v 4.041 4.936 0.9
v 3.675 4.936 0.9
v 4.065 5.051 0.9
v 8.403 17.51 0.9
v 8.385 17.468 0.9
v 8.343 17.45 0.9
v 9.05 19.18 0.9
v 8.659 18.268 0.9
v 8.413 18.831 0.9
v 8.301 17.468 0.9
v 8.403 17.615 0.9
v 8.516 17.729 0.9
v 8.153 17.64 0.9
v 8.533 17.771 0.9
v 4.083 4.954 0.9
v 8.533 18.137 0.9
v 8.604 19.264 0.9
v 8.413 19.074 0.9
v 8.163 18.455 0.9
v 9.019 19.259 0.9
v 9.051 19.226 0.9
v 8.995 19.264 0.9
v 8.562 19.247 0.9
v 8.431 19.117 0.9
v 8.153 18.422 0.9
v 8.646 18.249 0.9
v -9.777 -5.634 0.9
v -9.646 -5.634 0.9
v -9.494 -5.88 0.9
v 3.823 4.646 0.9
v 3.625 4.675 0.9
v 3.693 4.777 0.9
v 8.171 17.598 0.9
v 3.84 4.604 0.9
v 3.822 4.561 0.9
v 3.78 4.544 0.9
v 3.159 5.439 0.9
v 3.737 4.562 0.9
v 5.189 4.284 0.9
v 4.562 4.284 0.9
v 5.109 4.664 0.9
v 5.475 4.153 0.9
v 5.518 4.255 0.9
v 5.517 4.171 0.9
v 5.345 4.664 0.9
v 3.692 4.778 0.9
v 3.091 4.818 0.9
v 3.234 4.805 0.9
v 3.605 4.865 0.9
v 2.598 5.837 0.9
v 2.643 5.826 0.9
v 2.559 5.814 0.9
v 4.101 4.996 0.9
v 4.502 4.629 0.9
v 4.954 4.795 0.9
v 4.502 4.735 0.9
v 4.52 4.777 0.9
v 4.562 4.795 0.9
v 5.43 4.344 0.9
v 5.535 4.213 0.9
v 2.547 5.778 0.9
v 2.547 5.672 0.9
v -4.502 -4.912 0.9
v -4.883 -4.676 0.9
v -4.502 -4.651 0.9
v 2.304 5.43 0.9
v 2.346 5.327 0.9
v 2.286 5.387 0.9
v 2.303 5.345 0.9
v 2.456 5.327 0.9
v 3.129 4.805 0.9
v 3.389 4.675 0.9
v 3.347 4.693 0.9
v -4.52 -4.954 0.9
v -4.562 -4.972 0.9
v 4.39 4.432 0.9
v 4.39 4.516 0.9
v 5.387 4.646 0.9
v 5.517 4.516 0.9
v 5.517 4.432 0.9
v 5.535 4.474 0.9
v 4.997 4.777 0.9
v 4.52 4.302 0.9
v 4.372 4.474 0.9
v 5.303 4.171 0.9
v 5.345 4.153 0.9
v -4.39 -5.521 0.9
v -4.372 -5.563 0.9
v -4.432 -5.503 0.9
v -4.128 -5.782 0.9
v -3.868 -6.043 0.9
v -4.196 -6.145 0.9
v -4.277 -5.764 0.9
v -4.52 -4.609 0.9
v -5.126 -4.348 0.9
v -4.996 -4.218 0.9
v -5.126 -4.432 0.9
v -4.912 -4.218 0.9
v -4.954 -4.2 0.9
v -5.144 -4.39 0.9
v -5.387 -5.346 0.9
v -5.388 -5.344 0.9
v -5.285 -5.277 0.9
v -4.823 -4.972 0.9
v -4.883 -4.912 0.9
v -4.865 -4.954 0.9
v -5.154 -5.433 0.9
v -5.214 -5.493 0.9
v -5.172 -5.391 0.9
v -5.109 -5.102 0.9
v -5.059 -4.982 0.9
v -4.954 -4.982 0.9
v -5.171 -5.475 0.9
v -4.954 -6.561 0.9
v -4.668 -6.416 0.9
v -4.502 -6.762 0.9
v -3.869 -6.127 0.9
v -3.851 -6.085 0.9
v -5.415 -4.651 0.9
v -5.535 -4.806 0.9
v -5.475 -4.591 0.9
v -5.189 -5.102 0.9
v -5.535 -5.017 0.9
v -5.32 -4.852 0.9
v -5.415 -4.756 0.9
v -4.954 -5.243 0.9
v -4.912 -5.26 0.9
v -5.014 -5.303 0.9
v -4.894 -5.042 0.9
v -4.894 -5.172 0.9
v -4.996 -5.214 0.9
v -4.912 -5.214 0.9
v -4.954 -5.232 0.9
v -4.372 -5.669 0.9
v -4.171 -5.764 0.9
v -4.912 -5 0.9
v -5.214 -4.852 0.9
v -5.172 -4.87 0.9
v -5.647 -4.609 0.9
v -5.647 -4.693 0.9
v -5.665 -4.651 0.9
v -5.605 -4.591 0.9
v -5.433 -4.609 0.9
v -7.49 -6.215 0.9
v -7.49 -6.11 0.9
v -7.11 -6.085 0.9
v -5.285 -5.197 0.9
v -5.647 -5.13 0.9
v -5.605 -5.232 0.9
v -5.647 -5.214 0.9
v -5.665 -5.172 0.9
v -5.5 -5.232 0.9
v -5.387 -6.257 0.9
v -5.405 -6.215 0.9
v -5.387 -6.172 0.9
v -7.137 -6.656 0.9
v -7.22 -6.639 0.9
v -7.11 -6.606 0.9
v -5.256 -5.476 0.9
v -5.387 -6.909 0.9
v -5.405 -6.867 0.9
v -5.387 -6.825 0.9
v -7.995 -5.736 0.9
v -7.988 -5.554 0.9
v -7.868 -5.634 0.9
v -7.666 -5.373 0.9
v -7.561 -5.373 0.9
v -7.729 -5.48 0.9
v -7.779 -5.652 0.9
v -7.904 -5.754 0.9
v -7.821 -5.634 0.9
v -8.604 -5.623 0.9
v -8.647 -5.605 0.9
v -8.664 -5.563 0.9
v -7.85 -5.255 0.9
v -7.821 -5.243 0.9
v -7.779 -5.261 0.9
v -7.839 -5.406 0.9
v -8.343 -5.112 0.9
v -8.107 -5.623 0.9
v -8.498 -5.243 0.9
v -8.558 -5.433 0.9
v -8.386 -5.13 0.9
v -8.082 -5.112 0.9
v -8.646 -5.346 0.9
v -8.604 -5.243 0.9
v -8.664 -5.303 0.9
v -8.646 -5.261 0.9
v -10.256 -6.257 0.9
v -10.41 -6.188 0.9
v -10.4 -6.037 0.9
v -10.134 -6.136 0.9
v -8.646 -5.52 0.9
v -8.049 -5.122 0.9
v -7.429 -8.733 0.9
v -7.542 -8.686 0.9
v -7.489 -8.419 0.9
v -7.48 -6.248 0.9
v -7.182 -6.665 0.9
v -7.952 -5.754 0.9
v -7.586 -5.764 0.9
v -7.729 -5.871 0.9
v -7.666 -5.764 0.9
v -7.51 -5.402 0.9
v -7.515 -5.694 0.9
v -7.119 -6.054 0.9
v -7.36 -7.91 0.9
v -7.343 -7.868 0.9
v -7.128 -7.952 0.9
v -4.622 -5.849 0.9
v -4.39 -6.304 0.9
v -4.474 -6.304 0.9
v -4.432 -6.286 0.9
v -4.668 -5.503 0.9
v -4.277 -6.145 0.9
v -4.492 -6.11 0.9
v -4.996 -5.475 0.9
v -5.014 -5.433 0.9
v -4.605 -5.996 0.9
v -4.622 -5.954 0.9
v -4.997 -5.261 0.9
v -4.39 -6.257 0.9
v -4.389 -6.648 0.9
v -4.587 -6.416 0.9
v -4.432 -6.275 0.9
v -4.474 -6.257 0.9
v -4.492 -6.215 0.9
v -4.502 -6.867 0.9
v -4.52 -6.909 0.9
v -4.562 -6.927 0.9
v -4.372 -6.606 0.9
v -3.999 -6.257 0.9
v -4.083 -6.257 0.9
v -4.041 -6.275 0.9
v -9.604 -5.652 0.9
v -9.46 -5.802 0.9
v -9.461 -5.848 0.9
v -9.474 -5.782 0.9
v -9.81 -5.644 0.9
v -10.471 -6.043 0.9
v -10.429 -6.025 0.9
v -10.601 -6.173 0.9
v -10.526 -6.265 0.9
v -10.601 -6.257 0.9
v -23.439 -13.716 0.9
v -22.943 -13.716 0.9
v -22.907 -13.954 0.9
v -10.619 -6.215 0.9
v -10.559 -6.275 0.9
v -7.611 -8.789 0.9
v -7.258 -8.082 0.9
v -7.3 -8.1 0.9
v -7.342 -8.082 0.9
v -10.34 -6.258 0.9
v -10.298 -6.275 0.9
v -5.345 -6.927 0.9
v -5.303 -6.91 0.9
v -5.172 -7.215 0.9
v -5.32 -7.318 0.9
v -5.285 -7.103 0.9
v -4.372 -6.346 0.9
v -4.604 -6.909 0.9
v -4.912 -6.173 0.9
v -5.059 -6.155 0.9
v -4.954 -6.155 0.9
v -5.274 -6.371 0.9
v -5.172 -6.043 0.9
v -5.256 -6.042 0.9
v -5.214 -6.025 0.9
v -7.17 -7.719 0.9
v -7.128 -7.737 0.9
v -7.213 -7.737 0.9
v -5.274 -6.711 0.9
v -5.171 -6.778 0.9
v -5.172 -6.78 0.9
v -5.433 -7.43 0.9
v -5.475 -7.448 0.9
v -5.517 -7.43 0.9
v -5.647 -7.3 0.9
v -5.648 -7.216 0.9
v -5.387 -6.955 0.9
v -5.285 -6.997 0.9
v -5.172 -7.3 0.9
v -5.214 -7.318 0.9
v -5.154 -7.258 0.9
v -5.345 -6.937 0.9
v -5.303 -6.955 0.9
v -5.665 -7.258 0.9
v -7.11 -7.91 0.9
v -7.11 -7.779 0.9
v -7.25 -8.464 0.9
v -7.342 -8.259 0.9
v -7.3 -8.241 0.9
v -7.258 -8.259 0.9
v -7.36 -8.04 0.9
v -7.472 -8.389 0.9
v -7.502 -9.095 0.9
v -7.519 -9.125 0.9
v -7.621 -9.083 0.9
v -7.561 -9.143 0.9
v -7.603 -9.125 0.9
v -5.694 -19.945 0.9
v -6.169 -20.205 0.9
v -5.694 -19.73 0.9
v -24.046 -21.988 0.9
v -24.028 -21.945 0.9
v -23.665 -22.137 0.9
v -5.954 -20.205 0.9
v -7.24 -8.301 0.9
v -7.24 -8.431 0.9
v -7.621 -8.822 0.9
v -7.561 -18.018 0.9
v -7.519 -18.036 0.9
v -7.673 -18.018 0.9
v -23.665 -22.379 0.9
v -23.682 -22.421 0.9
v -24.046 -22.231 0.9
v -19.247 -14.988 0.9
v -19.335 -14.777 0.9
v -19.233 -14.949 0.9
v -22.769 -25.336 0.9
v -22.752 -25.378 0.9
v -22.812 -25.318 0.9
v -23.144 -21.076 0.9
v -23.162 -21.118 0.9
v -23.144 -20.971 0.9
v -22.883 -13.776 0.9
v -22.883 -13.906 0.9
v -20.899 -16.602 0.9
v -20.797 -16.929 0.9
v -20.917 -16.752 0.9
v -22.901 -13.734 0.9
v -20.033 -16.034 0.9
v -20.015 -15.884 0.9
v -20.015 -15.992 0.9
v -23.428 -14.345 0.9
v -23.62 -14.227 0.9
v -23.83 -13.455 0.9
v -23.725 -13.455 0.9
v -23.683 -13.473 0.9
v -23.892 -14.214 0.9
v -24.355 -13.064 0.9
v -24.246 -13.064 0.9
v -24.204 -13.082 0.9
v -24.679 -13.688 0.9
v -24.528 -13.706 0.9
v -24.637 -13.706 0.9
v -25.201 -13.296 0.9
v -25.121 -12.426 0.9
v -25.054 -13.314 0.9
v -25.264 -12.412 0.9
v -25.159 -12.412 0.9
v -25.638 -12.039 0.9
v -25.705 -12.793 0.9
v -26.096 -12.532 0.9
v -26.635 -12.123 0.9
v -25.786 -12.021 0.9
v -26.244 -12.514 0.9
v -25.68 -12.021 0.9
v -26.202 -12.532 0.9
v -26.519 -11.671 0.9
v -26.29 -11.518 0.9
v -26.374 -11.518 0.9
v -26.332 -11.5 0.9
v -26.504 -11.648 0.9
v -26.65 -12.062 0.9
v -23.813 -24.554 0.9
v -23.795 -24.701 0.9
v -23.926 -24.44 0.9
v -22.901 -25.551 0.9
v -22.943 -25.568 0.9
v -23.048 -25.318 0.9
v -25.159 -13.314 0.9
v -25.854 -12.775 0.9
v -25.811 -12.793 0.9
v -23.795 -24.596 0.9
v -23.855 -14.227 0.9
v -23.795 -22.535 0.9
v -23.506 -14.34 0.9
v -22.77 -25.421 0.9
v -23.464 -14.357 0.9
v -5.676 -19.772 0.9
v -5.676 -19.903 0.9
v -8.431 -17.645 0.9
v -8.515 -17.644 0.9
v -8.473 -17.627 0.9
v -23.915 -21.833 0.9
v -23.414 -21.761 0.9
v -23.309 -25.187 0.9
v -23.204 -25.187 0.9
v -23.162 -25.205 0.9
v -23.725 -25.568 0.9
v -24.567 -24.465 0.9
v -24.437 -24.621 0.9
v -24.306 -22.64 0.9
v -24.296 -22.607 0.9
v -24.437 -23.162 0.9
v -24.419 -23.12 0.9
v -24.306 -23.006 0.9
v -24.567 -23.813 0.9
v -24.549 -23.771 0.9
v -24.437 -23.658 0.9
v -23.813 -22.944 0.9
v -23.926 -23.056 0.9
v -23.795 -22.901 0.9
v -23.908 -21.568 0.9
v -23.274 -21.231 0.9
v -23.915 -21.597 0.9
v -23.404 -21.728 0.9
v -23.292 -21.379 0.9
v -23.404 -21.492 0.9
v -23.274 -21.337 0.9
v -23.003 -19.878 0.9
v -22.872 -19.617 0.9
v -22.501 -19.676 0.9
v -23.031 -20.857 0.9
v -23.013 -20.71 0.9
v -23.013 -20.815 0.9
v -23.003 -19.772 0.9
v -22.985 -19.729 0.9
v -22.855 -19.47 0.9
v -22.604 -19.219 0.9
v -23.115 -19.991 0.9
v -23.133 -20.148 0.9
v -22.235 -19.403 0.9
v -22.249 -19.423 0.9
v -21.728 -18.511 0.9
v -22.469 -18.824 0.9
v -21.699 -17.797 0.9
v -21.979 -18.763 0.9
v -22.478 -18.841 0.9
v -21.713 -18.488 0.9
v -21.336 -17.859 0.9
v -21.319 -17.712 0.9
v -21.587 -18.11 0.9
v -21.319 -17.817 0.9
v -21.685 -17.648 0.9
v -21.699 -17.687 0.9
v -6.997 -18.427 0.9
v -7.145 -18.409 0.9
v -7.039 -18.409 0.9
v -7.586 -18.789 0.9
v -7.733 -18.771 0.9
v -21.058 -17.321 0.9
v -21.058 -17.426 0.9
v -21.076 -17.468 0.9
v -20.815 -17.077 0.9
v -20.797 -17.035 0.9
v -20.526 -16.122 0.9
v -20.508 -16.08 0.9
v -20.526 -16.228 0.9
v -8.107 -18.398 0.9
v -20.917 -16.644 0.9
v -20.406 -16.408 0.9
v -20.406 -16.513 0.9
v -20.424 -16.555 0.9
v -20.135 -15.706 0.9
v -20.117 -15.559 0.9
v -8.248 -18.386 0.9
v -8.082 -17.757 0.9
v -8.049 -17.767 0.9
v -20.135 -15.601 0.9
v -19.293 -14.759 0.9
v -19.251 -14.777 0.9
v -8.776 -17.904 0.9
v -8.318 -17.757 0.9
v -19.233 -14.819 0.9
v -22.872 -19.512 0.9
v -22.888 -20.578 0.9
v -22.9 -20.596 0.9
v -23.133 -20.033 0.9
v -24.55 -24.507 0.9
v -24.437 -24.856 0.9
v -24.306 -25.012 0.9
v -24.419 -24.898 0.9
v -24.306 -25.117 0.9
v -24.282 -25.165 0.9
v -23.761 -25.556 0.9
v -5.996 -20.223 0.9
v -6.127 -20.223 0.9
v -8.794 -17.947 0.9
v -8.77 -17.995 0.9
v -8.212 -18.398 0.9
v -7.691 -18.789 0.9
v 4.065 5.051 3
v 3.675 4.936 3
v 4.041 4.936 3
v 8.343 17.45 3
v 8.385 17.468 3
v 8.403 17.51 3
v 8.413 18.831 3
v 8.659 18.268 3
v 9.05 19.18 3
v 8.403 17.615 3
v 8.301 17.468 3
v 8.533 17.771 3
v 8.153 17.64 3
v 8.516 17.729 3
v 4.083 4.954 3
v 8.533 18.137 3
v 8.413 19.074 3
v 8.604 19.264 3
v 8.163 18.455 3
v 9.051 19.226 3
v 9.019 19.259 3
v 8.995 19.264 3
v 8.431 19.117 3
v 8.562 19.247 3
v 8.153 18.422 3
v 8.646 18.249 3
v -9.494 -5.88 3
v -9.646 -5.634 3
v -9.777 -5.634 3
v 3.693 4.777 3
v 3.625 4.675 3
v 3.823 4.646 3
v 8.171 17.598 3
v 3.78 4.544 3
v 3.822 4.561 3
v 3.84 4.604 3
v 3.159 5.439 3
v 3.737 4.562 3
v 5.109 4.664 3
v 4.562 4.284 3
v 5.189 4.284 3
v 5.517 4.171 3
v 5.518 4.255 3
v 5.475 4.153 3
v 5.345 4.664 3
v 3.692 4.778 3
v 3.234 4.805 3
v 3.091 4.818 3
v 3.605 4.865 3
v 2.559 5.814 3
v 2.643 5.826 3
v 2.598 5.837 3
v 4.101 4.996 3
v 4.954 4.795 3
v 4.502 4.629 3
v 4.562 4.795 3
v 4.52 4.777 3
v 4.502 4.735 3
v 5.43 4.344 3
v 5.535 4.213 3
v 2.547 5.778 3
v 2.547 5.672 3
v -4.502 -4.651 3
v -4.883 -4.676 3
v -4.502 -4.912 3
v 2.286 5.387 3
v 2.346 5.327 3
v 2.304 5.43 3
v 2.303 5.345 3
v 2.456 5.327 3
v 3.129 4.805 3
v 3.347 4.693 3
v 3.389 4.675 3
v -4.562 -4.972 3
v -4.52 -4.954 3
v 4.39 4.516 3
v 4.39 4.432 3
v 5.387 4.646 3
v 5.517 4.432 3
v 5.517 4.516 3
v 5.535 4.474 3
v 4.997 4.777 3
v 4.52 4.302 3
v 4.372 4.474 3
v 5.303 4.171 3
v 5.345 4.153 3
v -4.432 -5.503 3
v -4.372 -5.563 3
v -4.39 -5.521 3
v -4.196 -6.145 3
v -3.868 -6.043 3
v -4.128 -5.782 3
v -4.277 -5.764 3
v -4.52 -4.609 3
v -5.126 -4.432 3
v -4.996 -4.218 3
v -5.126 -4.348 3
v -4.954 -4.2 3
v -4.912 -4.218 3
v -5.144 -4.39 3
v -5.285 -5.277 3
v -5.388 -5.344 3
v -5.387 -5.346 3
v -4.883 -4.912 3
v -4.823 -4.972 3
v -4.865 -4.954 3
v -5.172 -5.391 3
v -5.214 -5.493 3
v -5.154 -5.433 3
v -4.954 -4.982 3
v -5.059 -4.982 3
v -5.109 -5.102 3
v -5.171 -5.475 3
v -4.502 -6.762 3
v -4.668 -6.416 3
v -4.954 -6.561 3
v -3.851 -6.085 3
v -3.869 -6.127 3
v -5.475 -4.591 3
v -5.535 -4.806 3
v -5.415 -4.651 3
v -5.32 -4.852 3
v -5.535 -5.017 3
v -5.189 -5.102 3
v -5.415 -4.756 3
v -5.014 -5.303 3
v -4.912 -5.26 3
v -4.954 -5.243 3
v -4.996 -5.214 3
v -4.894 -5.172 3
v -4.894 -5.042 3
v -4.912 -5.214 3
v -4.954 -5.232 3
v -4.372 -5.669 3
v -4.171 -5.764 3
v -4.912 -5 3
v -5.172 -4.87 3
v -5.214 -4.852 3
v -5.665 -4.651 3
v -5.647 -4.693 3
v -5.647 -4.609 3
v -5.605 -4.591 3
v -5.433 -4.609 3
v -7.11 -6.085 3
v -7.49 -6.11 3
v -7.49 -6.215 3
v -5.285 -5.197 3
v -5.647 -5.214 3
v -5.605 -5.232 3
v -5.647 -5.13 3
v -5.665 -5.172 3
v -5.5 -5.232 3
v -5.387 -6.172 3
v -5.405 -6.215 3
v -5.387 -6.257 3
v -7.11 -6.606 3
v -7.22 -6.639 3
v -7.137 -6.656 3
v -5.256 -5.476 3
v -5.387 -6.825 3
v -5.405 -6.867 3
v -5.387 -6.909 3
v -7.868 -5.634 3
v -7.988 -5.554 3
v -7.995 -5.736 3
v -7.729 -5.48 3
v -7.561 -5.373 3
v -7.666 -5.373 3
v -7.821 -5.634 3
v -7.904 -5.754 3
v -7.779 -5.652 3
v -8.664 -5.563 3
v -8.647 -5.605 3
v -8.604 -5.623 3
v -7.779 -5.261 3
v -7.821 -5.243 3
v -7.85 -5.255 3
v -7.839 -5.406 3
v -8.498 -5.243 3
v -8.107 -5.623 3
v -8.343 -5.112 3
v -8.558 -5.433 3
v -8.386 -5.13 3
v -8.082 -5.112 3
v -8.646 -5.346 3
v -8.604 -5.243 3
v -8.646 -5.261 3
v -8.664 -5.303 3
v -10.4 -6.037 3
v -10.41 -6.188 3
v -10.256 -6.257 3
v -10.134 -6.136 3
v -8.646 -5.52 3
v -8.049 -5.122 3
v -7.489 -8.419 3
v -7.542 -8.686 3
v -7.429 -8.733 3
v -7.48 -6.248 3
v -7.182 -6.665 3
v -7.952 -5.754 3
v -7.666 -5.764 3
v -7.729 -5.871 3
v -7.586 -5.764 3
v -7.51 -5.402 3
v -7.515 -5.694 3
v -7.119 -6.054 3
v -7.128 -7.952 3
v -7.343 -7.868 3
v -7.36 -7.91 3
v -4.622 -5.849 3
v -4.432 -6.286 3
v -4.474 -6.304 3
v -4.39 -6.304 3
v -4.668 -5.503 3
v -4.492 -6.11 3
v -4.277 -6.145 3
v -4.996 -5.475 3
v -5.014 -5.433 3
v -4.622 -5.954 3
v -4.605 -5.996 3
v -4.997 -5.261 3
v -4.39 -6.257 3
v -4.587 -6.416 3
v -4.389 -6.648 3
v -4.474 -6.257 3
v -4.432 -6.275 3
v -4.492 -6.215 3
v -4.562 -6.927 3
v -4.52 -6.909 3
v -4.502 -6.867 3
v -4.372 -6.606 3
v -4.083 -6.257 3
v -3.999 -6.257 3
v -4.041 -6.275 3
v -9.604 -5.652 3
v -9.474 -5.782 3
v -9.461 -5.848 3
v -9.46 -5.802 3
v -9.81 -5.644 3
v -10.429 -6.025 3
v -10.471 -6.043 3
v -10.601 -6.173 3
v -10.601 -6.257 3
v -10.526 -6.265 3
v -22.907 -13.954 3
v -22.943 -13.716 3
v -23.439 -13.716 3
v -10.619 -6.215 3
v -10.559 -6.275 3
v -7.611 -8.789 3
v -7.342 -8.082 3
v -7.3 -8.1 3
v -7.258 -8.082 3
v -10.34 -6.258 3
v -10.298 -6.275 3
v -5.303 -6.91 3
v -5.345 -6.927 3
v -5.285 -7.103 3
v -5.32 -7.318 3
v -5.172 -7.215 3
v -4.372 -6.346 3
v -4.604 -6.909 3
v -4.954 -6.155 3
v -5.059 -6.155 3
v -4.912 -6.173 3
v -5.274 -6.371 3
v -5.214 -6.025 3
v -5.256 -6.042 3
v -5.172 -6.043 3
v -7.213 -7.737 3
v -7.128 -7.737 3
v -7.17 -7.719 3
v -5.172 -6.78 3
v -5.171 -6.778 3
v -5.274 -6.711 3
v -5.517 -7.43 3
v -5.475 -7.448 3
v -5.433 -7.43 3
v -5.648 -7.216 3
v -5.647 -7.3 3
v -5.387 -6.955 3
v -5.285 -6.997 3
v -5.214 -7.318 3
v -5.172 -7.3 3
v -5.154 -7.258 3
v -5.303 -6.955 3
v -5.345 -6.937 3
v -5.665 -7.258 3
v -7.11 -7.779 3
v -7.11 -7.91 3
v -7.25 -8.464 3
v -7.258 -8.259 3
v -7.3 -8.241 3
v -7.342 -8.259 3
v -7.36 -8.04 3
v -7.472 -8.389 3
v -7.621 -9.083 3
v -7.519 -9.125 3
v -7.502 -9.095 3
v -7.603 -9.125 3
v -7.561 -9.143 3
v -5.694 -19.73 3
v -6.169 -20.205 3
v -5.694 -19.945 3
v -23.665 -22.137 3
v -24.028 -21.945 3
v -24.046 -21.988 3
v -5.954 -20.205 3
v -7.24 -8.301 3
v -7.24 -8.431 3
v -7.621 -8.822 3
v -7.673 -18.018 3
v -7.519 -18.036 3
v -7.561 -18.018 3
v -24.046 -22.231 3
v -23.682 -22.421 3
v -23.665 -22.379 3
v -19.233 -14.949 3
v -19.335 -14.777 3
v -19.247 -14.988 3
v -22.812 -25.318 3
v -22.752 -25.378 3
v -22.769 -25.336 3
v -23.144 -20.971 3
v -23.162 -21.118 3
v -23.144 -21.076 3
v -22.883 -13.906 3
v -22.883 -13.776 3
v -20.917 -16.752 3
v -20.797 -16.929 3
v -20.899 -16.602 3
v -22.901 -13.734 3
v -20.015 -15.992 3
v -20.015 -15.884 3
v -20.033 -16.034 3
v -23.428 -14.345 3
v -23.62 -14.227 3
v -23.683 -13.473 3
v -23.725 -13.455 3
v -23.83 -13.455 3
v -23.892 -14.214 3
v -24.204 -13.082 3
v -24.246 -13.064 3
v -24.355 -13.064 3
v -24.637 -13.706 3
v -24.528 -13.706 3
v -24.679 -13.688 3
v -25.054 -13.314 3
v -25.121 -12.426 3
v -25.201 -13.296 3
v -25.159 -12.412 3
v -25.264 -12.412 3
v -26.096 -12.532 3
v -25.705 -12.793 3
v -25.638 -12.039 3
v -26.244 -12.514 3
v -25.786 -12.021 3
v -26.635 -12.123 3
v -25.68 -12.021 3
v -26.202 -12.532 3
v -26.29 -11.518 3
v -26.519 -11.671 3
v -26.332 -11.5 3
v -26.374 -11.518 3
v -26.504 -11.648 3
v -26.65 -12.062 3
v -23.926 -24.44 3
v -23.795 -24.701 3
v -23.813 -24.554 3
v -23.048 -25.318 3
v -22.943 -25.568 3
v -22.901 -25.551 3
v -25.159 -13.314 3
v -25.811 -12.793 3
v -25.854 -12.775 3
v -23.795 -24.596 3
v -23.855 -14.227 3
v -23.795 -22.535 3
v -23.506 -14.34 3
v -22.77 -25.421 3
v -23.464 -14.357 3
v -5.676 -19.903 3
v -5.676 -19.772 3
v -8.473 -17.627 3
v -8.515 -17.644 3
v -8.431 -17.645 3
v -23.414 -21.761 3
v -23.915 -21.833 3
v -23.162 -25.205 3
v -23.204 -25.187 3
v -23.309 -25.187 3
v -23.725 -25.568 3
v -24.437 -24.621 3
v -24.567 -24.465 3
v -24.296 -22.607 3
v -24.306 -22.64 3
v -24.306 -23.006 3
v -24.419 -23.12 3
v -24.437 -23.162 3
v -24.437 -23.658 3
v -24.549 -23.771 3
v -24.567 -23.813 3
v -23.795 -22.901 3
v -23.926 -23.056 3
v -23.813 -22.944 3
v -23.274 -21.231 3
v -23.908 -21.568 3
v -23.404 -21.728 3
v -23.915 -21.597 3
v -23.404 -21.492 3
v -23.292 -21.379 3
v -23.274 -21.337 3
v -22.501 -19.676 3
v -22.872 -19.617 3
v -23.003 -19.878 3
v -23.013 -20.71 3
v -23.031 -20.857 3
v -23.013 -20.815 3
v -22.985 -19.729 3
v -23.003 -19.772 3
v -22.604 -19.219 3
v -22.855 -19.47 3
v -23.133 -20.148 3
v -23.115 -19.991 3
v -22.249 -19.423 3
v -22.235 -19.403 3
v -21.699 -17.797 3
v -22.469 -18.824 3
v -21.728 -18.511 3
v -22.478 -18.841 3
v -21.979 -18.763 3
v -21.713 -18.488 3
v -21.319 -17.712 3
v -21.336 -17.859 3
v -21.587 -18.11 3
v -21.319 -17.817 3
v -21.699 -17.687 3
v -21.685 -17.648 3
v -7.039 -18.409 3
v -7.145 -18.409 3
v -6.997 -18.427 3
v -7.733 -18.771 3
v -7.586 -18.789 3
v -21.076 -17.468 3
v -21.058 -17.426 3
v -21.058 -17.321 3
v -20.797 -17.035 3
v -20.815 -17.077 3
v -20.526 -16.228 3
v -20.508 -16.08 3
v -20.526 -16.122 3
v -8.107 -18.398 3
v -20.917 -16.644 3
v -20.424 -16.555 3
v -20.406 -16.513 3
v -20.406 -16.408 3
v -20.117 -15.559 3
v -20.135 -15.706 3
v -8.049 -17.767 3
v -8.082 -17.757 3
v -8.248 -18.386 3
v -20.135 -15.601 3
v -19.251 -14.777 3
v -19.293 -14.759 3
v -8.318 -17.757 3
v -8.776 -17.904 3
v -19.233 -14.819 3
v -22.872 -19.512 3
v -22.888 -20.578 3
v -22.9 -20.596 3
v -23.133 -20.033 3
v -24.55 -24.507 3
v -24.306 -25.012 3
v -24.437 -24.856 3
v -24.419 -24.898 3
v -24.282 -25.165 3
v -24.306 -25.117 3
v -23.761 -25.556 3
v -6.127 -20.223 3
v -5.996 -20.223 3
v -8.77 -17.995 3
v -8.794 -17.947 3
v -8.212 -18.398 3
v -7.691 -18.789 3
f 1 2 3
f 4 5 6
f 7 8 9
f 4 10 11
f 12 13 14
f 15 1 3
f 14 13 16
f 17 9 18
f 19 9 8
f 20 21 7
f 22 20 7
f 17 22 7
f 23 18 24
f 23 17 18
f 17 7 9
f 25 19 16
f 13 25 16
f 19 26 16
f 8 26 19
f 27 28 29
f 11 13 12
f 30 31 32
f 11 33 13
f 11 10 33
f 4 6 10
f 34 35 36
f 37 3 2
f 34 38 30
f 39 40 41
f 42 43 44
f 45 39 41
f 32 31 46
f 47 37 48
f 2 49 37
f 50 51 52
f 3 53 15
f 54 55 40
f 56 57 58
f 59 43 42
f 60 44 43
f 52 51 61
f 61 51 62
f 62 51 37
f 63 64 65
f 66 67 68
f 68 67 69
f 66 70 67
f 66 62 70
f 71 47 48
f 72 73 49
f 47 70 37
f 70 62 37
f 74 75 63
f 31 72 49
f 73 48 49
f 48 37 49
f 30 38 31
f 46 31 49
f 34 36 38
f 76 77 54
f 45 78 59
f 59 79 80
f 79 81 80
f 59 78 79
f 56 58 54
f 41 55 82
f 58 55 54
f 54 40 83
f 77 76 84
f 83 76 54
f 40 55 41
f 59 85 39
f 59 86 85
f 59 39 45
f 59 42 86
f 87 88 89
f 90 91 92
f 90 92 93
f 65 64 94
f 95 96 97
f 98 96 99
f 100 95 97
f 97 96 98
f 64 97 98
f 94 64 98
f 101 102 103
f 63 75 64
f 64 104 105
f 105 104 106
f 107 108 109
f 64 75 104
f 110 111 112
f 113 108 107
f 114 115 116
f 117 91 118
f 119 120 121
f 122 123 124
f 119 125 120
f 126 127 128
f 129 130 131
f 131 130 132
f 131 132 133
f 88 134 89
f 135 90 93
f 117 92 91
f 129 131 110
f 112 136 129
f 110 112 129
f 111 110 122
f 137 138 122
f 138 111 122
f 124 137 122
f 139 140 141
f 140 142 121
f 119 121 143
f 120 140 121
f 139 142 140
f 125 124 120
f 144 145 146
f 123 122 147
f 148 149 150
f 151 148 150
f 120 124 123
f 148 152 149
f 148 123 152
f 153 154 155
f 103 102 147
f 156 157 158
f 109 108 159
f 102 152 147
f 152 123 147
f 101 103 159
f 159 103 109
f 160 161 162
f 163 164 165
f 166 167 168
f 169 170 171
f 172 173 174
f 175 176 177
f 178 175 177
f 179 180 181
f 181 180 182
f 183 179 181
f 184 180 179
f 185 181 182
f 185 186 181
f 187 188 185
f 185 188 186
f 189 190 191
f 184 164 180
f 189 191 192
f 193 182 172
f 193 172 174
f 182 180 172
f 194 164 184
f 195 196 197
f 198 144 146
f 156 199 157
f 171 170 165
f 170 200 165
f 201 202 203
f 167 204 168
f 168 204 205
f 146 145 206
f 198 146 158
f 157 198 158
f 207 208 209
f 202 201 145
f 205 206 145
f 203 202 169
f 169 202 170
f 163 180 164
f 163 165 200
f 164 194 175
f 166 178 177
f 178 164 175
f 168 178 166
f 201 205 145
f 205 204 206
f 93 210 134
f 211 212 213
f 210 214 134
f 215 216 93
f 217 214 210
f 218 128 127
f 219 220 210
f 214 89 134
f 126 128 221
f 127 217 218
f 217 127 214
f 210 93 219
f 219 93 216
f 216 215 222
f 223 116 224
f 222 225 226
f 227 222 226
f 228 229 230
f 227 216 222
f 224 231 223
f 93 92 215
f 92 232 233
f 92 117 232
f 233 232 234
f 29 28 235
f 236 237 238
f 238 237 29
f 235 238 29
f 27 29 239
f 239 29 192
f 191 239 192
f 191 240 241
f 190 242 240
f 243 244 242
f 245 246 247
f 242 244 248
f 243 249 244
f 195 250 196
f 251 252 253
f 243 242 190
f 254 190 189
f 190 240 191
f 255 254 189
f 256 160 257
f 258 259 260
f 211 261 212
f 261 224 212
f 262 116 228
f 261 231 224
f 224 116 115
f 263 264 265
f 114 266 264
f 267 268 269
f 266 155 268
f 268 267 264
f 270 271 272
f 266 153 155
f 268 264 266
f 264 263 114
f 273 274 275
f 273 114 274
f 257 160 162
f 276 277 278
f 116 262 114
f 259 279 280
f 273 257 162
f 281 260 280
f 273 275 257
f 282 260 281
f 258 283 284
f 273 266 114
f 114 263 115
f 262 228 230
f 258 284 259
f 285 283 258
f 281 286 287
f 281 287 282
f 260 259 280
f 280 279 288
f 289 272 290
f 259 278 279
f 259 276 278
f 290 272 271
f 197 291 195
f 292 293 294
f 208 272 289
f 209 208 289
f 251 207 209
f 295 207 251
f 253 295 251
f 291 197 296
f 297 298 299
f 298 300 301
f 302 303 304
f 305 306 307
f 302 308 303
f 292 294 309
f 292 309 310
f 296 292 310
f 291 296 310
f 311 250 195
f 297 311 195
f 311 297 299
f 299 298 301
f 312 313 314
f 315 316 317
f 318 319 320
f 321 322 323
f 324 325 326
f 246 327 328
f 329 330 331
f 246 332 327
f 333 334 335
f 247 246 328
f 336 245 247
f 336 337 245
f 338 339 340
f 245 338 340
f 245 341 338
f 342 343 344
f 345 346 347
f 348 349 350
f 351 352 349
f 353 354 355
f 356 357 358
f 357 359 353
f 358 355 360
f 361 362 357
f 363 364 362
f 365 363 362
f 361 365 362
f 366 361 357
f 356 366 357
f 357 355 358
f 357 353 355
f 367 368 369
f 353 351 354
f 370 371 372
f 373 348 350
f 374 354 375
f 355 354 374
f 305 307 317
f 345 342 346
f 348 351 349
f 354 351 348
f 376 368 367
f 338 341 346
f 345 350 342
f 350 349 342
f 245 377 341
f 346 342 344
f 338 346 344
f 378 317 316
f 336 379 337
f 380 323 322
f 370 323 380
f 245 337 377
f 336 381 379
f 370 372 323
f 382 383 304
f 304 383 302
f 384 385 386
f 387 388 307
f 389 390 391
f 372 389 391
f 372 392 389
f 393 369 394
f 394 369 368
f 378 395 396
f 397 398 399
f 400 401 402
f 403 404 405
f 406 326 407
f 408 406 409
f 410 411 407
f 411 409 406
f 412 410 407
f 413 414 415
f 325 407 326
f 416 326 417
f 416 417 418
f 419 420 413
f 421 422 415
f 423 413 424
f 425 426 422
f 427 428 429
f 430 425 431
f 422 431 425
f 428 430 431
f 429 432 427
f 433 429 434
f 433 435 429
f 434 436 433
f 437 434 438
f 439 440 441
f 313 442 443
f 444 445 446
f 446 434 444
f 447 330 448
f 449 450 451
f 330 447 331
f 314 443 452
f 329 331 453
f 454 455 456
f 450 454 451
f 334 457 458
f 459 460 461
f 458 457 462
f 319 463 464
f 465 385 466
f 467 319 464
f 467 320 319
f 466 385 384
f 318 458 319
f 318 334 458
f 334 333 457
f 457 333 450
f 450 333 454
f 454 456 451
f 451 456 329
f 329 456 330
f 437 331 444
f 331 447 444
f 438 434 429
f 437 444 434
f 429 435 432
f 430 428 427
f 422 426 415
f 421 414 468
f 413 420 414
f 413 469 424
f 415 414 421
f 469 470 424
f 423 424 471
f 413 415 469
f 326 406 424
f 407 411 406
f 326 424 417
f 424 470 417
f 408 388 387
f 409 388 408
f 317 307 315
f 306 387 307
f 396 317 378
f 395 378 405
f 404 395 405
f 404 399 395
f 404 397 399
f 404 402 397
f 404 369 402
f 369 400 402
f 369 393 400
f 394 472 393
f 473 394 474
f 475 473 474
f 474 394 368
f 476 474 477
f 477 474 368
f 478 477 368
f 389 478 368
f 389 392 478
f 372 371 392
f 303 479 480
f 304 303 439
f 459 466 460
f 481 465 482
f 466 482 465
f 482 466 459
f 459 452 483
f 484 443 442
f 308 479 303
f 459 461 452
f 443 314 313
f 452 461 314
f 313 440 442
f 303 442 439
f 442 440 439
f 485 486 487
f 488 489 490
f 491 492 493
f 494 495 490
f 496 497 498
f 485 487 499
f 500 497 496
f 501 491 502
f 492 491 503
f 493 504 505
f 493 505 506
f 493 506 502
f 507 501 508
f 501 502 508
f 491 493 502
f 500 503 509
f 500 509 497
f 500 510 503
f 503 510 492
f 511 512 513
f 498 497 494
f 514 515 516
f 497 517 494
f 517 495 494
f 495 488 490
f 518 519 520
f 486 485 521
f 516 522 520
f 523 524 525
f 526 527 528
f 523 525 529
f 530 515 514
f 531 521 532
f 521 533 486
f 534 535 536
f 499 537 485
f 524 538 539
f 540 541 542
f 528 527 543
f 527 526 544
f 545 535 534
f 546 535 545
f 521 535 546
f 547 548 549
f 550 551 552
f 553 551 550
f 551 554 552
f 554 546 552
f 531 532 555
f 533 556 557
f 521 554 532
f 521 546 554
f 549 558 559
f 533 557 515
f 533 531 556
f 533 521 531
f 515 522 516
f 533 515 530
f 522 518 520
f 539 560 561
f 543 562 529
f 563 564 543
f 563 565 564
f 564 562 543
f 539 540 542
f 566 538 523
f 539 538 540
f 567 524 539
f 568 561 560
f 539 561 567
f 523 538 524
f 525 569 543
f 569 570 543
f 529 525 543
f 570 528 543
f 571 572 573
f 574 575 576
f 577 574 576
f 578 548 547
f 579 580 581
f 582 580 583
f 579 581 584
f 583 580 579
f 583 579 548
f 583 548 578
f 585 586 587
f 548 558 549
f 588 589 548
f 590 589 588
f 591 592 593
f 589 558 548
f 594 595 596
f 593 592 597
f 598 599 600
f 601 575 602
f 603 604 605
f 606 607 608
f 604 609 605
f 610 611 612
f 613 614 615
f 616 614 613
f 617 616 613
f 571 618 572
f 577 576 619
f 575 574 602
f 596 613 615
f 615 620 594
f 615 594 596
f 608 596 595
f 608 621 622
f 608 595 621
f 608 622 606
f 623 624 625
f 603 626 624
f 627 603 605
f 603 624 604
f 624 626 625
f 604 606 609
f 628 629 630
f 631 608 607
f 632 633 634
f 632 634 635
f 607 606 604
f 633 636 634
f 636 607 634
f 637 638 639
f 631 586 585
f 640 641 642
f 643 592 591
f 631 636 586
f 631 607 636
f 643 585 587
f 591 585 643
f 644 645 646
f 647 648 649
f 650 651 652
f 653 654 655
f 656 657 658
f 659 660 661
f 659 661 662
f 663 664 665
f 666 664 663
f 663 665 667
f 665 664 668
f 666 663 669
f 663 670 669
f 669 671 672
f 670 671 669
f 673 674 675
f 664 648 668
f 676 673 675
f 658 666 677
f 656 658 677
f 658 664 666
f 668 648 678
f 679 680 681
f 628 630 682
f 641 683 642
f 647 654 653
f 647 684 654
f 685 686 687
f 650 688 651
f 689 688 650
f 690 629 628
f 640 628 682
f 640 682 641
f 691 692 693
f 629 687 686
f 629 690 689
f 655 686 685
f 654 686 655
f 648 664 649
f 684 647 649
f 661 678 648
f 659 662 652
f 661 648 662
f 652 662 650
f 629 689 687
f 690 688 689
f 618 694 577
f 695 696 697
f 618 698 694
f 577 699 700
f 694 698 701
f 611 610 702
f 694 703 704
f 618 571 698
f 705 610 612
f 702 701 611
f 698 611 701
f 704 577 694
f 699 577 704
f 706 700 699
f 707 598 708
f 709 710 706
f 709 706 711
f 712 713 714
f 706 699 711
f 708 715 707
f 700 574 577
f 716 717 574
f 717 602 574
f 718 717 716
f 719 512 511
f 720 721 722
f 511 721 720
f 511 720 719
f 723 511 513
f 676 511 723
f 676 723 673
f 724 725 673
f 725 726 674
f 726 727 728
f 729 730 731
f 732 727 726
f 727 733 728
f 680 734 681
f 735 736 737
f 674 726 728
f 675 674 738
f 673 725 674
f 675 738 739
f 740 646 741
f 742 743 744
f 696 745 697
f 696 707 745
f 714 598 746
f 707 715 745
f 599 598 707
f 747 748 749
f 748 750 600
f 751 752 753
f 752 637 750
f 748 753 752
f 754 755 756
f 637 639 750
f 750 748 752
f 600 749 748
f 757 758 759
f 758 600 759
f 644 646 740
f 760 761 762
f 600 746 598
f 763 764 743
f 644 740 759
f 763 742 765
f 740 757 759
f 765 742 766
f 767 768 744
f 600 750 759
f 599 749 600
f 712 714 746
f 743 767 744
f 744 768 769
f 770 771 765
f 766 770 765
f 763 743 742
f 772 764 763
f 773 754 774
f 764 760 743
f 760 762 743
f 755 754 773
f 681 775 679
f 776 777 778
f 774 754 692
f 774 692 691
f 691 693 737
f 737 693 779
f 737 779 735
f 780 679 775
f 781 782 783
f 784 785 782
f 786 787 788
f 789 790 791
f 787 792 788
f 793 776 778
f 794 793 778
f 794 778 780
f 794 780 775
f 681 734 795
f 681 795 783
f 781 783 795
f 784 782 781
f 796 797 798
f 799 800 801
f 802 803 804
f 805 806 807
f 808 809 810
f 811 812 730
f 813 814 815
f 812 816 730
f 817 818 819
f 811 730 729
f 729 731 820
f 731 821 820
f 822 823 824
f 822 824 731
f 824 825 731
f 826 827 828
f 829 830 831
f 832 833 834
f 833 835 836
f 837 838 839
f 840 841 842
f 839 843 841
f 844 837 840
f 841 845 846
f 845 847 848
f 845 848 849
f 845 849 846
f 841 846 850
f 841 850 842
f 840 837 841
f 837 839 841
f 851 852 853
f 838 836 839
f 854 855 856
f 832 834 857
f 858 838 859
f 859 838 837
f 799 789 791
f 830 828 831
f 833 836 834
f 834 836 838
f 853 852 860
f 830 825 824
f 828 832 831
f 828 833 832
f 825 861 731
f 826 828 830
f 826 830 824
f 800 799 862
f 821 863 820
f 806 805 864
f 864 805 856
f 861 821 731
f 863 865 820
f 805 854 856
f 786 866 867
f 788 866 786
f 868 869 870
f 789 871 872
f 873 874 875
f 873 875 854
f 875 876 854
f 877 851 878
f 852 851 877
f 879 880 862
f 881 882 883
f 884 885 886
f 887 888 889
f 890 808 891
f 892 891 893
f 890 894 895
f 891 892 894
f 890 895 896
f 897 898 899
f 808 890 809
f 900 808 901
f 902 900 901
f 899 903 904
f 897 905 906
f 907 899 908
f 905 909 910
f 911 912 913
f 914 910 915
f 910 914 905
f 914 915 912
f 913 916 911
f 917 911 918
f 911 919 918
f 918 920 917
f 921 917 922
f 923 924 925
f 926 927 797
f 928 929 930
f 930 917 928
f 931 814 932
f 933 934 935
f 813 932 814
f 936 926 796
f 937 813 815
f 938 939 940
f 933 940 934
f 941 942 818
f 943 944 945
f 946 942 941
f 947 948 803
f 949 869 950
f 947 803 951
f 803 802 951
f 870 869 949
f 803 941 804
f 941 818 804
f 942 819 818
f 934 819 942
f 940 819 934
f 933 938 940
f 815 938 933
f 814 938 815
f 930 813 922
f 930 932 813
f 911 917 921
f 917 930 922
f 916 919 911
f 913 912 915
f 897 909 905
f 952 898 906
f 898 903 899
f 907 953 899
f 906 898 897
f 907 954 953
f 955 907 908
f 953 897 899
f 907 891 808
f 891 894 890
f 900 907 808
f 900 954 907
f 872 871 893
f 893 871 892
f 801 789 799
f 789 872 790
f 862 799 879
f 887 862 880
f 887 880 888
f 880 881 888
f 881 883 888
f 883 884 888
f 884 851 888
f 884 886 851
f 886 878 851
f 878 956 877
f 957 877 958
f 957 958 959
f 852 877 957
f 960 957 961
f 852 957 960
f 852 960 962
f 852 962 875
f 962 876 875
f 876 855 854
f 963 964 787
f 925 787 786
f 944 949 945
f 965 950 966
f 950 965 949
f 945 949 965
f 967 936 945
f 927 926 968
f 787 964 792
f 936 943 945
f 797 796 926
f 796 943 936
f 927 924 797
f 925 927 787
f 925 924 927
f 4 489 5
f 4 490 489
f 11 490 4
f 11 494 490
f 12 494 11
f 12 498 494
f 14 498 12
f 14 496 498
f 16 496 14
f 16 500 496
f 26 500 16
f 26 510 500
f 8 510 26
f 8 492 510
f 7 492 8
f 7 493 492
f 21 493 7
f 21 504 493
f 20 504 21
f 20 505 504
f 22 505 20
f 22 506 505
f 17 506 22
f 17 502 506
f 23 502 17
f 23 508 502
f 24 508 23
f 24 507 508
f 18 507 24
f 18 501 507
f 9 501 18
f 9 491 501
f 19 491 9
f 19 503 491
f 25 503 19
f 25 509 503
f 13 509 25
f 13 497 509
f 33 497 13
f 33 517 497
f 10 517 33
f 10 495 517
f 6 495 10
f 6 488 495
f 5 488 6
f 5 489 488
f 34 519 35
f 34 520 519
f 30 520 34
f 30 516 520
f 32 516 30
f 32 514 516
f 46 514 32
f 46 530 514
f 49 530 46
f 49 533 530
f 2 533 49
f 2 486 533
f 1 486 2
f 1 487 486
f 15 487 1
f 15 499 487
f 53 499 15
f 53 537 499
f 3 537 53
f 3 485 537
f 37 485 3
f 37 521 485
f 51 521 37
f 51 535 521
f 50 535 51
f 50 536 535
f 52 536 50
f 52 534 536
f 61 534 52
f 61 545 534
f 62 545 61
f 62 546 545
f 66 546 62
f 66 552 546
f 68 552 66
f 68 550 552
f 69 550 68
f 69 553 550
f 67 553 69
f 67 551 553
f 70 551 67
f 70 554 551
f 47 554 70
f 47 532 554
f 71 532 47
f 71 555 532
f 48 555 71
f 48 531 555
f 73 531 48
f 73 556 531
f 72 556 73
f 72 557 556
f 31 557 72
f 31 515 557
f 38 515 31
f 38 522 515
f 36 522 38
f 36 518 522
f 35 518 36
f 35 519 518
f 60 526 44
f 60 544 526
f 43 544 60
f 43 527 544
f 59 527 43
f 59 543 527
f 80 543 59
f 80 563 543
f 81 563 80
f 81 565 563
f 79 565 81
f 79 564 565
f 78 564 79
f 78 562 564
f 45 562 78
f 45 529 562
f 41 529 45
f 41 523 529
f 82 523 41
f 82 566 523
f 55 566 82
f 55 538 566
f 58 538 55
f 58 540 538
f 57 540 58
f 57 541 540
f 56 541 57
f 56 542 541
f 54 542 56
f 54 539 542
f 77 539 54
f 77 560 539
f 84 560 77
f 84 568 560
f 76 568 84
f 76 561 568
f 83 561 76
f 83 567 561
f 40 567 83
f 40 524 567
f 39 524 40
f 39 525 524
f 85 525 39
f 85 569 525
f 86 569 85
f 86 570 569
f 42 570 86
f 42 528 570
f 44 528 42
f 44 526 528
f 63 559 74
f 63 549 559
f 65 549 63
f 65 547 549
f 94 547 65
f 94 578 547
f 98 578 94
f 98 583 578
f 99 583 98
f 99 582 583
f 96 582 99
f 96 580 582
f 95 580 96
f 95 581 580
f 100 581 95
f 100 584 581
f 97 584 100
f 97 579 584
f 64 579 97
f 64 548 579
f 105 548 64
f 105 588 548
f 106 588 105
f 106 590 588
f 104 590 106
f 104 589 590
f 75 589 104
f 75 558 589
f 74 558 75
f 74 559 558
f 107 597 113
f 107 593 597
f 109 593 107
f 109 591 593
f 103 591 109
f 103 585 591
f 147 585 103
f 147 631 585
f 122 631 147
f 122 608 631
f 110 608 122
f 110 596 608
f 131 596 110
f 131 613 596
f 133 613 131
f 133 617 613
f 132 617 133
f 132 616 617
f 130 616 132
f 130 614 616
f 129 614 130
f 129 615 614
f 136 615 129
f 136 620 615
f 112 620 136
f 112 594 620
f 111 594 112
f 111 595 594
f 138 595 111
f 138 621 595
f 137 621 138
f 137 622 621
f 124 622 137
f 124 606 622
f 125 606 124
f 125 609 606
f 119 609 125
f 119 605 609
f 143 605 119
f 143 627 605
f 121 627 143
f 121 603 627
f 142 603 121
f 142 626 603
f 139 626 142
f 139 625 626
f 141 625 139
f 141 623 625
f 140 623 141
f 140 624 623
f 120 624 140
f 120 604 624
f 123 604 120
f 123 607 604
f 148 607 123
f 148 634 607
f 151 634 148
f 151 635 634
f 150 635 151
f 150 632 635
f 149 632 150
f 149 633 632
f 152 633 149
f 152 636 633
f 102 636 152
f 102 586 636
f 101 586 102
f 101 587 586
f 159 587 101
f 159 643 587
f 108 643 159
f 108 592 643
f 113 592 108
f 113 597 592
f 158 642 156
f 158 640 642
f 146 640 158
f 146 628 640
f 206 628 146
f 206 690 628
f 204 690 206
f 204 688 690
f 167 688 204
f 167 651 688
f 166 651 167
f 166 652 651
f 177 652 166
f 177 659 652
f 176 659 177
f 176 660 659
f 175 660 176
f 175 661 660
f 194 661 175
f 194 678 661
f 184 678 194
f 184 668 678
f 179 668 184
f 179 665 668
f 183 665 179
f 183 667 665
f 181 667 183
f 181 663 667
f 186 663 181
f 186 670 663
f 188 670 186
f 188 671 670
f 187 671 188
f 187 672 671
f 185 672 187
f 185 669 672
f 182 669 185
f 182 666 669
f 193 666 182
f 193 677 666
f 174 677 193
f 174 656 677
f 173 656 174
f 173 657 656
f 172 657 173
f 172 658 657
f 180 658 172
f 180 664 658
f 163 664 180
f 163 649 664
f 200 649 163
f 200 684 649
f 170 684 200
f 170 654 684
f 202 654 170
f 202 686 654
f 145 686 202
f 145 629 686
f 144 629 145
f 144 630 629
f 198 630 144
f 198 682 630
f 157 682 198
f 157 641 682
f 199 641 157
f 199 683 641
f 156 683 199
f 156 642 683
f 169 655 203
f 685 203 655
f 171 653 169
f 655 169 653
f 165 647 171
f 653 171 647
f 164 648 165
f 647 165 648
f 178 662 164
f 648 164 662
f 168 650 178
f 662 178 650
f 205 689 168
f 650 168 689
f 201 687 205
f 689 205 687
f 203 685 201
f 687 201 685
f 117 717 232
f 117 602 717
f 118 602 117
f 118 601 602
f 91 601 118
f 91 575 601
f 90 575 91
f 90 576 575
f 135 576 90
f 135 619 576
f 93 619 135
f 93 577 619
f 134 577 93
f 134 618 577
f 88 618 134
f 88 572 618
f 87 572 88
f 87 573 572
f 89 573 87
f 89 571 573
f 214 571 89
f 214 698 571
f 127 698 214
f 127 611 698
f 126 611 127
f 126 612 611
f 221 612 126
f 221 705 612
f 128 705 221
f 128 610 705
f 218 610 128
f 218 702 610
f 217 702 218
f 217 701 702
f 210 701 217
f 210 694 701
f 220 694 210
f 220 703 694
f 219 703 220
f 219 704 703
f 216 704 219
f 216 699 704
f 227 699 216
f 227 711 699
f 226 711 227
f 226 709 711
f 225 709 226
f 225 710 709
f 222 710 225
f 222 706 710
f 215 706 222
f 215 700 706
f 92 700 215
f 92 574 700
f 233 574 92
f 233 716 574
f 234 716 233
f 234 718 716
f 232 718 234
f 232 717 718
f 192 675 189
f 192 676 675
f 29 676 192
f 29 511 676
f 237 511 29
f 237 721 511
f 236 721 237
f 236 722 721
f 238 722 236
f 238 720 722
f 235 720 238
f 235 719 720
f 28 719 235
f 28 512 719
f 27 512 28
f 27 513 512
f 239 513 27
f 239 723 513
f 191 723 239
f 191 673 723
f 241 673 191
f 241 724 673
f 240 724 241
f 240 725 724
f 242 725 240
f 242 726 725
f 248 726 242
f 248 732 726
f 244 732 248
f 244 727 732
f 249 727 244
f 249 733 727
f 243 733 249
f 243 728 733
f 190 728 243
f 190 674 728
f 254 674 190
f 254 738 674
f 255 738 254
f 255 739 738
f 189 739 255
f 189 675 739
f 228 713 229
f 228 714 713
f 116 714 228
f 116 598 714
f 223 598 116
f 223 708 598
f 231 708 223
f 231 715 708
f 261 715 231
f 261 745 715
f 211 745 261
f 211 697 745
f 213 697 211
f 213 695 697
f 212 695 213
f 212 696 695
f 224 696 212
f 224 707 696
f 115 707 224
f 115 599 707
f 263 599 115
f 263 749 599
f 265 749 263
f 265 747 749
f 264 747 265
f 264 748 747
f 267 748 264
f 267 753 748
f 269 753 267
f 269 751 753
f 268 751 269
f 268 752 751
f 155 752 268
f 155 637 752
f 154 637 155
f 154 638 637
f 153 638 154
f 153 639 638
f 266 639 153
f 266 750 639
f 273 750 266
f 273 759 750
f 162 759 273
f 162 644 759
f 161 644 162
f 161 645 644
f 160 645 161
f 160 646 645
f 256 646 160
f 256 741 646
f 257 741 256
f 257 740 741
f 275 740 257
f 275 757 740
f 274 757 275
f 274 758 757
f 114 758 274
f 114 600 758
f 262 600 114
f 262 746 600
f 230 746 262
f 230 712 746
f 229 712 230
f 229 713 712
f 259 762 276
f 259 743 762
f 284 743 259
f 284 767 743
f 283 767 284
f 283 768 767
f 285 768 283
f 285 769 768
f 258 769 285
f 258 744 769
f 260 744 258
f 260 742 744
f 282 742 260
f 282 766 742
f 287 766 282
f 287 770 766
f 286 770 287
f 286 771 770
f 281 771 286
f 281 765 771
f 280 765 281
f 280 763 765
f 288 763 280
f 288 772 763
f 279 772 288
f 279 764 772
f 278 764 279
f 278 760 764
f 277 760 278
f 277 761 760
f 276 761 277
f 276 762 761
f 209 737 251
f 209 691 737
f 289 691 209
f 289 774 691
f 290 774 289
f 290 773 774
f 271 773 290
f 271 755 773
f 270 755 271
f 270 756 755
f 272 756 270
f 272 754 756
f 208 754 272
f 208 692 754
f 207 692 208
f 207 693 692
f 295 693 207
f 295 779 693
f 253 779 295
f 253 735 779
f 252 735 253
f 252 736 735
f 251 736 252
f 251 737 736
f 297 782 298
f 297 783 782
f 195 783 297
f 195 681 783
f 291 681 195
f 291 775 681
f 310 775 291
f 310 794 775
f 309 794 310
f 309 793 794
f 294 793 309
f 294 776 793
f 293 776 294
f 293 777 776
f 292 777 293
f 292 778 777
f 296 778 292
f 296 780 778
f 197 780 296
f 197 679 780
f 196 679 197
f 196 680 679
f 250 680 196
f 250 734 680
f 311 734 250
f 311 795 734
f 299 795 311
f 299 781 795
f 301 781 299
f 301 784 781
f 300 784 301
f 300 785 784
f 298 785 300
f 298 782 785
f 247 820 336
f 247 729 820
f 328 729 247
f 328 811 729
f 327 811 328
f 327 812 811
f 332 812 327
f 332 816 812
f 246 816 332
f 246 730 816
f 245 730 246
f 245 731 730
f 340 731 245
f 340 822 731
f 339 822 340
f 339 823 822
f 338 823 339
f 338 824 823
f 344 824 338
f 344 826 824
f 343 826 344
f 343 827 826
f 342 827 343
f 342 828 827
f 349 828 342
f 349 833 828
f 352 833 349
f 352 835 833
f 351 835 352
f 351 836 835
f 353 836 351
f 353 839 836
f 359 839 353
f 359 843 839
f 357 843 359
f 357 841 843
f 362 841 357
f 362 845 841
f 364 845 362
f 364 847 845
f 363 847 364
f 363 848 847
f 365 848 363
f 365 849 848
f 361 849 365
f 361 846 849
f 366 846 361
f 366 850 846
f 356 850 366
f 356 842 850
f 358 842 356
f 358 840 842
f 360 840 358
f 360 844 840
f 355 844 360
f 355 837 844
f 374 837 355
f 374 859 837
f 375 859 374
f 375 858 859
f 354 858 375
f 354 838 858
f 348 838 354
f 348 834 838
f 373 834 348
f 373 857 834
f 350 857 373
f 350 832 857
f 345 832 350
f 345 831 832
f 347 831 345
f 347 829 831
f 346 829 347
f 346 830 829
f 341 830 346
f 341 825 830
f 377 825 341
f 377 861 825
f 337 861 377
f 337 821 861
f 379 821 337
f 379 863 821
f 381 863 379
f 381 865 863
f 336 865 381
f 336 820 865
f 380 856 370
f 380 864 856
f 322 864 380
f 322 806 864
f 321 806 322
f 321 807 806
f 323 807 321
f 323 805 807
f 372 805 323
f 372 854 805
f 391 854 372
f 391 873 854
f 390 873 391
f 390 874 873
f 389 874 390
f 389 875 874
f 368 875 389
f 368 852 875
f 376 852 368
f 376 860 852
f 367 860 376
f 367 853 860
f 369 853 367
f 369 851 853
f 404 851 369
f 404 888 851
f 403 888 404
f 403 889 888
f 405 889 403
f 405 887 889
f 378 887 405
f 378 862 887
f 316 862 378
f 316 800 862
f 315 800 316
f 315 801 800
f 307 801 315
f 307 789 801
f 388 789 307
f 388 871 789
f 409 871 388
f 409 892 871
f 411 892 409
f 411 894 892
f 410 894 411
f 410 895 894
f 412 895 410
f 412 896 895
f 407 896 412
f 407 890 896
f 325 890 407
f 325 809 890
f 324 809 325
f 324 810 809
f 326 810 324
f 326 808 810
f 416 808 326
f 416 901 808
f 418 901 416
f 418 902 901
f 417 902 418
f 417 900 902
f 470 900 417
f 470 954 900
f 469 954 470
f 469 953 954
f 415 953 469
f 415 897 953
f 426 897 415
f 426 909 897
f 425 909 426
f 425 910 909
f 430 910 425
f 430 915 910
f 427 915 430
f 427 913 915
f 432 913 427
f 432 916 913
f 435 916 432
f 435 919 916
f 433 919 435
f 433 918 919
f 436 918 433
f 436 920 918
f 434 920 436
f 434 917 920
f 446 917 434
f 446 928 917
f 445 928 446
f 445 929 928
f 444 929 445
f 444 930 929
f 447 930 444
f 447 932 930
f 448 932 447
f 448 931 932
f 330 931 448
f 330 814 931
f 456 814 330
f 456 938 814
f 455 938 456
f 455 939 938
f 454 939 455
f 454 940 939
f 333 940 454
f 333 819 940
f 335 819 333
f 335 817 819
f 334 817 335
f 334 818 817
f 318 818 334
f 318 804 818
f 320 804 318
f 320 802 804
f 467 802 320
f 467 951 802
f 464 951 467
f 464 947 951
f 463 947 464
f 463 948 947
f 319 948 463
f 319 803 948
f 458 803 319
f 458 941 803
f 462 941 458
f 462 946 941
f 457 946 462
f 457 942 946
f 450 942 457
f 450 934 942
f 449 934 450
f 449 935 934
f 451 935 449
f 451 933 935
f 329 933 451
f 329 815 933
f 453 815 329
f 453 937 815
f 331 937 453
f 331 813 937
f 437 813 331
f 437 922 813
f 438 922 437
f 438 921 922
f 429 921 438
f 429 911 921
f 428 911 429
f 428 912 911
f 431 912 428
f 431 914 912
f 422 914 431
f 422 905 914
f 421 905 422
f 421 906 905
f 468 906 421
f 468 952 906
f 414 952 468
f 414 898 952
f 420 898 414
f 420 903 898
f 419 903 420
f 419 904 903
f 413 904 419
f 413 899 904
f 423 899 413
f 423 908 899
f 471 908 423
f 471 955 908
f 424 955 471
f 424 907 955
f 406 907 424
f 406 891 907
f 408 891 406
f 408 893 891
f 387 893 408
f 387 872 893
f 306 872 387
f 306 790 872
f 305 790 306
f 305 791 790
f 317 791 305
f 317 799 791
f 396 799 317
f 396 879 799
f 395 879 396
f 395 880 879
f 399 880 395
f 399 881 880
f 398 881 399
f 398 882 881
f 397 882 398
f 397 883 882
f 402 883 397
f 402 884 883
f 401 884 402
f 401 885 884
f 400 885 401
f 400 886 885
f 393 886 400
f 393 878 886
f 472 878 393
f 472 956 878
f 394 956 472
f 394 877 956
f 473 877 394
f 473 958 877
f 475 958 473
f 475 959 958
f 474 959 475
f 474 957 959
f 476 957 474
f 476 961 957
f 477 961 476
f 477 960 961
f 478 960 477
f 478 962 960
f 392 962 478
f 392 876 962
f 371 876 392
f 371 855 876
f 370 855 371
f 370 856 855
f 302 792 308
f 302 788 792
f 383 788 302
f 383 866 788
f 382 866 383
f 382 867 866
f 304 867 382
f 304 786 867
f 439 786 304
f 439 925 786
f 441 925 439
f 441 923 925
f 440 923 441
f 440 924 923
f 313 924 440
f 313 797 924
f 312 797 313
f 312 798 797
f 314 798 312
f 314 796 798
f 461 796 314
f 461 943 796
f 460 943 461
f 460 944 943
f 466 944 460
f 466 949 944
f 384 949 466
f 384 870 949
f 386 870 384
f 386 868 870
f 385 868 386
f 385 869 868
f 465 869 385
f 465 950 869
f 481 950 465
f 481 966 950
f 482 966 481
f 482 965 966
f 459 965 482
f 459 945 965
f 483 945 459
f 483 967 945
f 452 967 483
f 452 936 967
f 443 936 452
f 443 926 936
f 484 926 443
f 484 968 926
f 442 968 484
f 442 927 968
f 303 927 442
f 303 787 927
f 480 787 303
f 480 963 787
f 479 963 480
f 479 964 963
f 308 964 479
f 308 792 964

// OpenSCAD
$fn = 24;
translate([0, -2.500, 0.900])
  linear_extrude(height=2.100) {
offset(r=0.06, $fn=8) {
    polygon(points=[[-8.734,-15.447],[-8.212,-15.838],[-8.082,-15.838],[-7.691,-16.229],[-7.561,-16.229],[-6.127,-17.663],[-5.996,-17.663],[-5.736,-17.403],[-5.736,-17.272],[-7.039,-15.969],[-7.170,-15.969],[-7.561,-15.578],[-7.691,-15.578],[-8.082,-15.317],[-8.343,-15.317],[-8.473,-15.187]], paths=[[0,1,2,3,4,5,6,7,8,9,10,11,12,13,14,15]]);
    polygon(points=[[-19.293,-12.319],[-20.075,-13.101],[-20.075,-13.231],[-20.466,-13.622],[-20.466,-13.753],[-20.857,-14.144],[-20.857,-14.274],[-21.639,-15.187],[-21.639,-15.317],[-22.421,-16.360],[-22.552,-16.751],[-22.812,-17.012],[-22.812,-17.142],[-22.943,-17.272],[-22.943,-17.403],[-23.073,-17.533],[-23.073,-17.663],[-23.855,-19.097],[-23.855,-19.358],[-23.986,-19.488],[-23.986,-19.749],[-24.246,-20.140],[-24.246,-20.531],[-24.377,-20.662],[-24.377,-21.183],[-24.507,-21.313],[-24.507,-21.965],[-24.377,-22.096],[-24.377,-22.356],[-24.246,-22.487],[-24.246,-22.617],[-23.725,-23.008],[-22.943,-23.008],[-22.812,-22.878],[-22.552,-22.878],[-23.073,-22.878],[-23.204,-22.747],[-23.334,-22.747],[-23.855,-22.226],[-23.855,-22.096],[-23.986,-21.965],[-23.986,-20.531],[-23.855,-20.401],[-23.855,-20.010],[-23.725,-19.879],[-23.725,-19.619],[-23.464,-19.228],[-23.464,-18.967],[-23.334,-18.837],[-23.334,-18.706],[-23.204,-18.576],[-23.204,-18.446],[-23.073,-18.315],[-23.073,-18.185],[-22.943,-18.054],[-22.552,-17.142],[-22.291,-16.881],[-22.030,-16.229],[-21.770,-15.969],[-21.639,-15.578],[-21.379,-15.317],[-21.379,-15.187],[-21.118,-14.926],[-21.118,-14.796],[-20.857,-14.535],[-20.857,-14.404],[-20.466,-14.013],[-20.466,-13.883],[-20.075,-13.492],[-20.075,-13.362],[-19.293,-12.449]], paths=[[0,1,2,3,4,5,6,7,8,9,10,11,12,13,14,15,16,17,18,19,20,21,22,23,24,25,26,27,28,29,30,31,32,33,34,35,36,37,38,39,40,41,42,43,44,45,46,47,48,49,50,51,52,53,54,55,56,57,58,59,60,61,62,63,64,65,66,67,68,69,70]]);
    polygon(points=[[-26.462,-9.190],[-26.593,-9.581],[-26.202,-9.972],[-26.071,-9.972],[-25.811,-10.233],[-25.680,-10.233],[-25.159,-10.754],[-25.029,-10.754],[-24.637,-11.146],[-24.507,-11.146],[-23.855,-11.667],[-23.595,-11.667],[-23.464,-11.797],[-22.943,-11.406],[-22.943,-11.276],[-23.464,-11.276],[-23.725,-11.015],[-23.855,-11.015],[-24.246,-10.624],[-24.377,-10.624],[-25.159,-9.972],[-25.289,-9.972],[-25.680,-9.581],[-25.811,-9.581],[-26.332,-9.060]], paths=[[0,1,2,3,4,5,6,7,8,9,10,11,12,13,14,15,16,17,18,19,20,21,22,23,24]]);
    polygon(points=[[-9.516,-3.324],[-9.646,-3.194],[-9.777,-3.194],[-10.559,-3.715],[-10.429,-3.585],[-10.298,-3.715],[-10.168,-3.585]], paths=[[0,1,2,3,4,5,6]]);
    polygon(points=[[-8.343,-2.672],[-8.473,-2.803],[-8.734,-2.803],[-8.604,-2.803],[-8.473,-2.933],[-8.604,-3.063],[-8.734,-3.063],[-8.082,-3.063],[-7.952,-3.194],[-7.821,-3.194],[-7.430,-3.585],[-7.430,-3.715],[-7.170,-4.106],[-7.170,-5.279],[-7.300,-5.410],[-7.300,-5.801],[-7.430,-5.931],[-7.561,-6.583],[-7.561,-6.322],[-7.300,-5.931],[-7.300,-5.540],[-7.170,-5.410],[-7.170,-3.585],[-7.561,-2.933],[-7.691,-2.933],[-8.082,-2.672],[-8.082,-3.063],[-7.821,-2.803],[-7.430,-3.194],[-7.561,-3.324],[-7.691,-3.324]], paths=[[0,1,2,3,4,5,6,7,8,9,10,11,12,13,14,15,16,17,18,19,20,21,22,23,24,25],[26,27,28,29,30]]);
    polygon(points=[[-4.954,-1.760],[-5.084,-1.890],[-5.214,-1.760],[-4.823,-2.151],[-4.823,-2.412],[-4.954,-2.542],[-5.084,-2.542],[-5.214,-2.412],[-5.345,-2.412],[-5.475,-2.281],[-5.475,-2.151],[-5.736,-2.151],[-5.605,-2.151],[-5.475,-2.281],[-5.475,-2.542],[-5.605,-2.672],[-5.736,-2.672],[-5.475,-2.672],[-5.214,-2.933],[-5.214,-3.194],[-5.214,-2.933],[-5.345,-2.803],[-5.345,-2.672],[-5.214,-2.542],[-5.084,-2.542],[-4.954,-2.672],[-4.954,-2.933],[-4.562,-3.324],[-4.562,-3.454],[-4.432,-3.585],[-4.432,-3.846],[-4.562,-3.976],[-4.693,-3.976],[-4.954,-3.715],[-5.084,-3.715],[-5.214,-3.585],[-5.214,-3.454],[-5.214,-3.585],[-5.345,-3.715],[-5.214,-3.846],[-5.214,-4.237],[-5.345,-4.367],[-5.345,-4.497],[-5.605,-4.758],[-5.736,-4.758],[-5.866,-4.628],[-5.736,-4.758],[-5.605,-4.758],[-5.475,-4.888],[-5.475,-5.019],[-5.475,-4.888],[-5.345,-4.758],[-5.214,-4.758],[-5.345,-4.628],[-5.345,-4.367],[-4.954,-3.976],[-4.562,-4.367],[-4.562,-4.497],[-4.562,-4.237],[-4.432,-4.106],[-4.432,-3.715],[-4.302,-3.585],[-4.171,-3.585],[-4.041,-3.715],[-3.911,-3.585],[-4.171,-3.324],[-4.302,-3.324],[-4.432,-3.194],[-4.432,-3.063],[-4.693,-3.063],[-4.954,-2.803],[-4.954,-2.542],[-4.823,-2.412],[-4.562,-2.412],[-4.432,-2.542],[-4.562,-2.412],[-4.562,-2.151]], paths=[[0,1,2,3,4,5,6,7,8,9,10,11,12,13,14,15,16,17,18,19,20,21,22,23,24,25,26,27,28,29,30,31,32,33,34,35,36,37,38,39,40,41,42,43,44,45,46,47,48,49,50,51,52,53,54,55,56,57,58,59,60,61,62,63,64,65,66,67,68,69,70,71,72,73,74,75,76]]);
    polygon(points=[[4.171,6.974],[4.432,6.974],[4.562,6.844],[5.214,6.844],[5.345,6.713],[5.605,6.713],[5.475,6.713],[5.345,6.844],[5.475,6.974],[5.866,6.974],[5.475,6.974],[5.345,7.104],[5.084,7.104],[4.954,7.235],[4.562,7.235],[4.562,7.104],[4.432,6.974]], paths=[[0,1,2,3,4,5,6,7,8,9,10,11,12,13,14,15,16]]);
    polygon(points=[[2.346,7.887],[2.477,7.887],[3.129,7.365],[3.259,7.365],[3.389,7.235],[3.650,7.235],[3.780,7.104],[3.911,7.104],[3.780,7.104],[3.520,7.365],[3.650,7.496],[4.041,7.496],[4.171,7.365],[4.302,7.365],[4.171,7.365],[4.041,7.496],[3.129,7.887],[2.607,8.278],[2.607,8.147]], paths=[[0,1,2,3,4,5,6,7,8,9,10,11,12,13,14,15,16,17,18]]);
    polygon(points=[[8.995,21.704],[8.604,21.704],[8.473,21.574],[8.473,21.313],[8.213,20.922],[8.213,20.140],[8.343,20.010],[8.343,20.140],[8.473,20.271],[8.473,20.662],[8.604,20.792]], paths=[[0,1,2,3,4,5,6,7,8,9,10]]);
}
}
